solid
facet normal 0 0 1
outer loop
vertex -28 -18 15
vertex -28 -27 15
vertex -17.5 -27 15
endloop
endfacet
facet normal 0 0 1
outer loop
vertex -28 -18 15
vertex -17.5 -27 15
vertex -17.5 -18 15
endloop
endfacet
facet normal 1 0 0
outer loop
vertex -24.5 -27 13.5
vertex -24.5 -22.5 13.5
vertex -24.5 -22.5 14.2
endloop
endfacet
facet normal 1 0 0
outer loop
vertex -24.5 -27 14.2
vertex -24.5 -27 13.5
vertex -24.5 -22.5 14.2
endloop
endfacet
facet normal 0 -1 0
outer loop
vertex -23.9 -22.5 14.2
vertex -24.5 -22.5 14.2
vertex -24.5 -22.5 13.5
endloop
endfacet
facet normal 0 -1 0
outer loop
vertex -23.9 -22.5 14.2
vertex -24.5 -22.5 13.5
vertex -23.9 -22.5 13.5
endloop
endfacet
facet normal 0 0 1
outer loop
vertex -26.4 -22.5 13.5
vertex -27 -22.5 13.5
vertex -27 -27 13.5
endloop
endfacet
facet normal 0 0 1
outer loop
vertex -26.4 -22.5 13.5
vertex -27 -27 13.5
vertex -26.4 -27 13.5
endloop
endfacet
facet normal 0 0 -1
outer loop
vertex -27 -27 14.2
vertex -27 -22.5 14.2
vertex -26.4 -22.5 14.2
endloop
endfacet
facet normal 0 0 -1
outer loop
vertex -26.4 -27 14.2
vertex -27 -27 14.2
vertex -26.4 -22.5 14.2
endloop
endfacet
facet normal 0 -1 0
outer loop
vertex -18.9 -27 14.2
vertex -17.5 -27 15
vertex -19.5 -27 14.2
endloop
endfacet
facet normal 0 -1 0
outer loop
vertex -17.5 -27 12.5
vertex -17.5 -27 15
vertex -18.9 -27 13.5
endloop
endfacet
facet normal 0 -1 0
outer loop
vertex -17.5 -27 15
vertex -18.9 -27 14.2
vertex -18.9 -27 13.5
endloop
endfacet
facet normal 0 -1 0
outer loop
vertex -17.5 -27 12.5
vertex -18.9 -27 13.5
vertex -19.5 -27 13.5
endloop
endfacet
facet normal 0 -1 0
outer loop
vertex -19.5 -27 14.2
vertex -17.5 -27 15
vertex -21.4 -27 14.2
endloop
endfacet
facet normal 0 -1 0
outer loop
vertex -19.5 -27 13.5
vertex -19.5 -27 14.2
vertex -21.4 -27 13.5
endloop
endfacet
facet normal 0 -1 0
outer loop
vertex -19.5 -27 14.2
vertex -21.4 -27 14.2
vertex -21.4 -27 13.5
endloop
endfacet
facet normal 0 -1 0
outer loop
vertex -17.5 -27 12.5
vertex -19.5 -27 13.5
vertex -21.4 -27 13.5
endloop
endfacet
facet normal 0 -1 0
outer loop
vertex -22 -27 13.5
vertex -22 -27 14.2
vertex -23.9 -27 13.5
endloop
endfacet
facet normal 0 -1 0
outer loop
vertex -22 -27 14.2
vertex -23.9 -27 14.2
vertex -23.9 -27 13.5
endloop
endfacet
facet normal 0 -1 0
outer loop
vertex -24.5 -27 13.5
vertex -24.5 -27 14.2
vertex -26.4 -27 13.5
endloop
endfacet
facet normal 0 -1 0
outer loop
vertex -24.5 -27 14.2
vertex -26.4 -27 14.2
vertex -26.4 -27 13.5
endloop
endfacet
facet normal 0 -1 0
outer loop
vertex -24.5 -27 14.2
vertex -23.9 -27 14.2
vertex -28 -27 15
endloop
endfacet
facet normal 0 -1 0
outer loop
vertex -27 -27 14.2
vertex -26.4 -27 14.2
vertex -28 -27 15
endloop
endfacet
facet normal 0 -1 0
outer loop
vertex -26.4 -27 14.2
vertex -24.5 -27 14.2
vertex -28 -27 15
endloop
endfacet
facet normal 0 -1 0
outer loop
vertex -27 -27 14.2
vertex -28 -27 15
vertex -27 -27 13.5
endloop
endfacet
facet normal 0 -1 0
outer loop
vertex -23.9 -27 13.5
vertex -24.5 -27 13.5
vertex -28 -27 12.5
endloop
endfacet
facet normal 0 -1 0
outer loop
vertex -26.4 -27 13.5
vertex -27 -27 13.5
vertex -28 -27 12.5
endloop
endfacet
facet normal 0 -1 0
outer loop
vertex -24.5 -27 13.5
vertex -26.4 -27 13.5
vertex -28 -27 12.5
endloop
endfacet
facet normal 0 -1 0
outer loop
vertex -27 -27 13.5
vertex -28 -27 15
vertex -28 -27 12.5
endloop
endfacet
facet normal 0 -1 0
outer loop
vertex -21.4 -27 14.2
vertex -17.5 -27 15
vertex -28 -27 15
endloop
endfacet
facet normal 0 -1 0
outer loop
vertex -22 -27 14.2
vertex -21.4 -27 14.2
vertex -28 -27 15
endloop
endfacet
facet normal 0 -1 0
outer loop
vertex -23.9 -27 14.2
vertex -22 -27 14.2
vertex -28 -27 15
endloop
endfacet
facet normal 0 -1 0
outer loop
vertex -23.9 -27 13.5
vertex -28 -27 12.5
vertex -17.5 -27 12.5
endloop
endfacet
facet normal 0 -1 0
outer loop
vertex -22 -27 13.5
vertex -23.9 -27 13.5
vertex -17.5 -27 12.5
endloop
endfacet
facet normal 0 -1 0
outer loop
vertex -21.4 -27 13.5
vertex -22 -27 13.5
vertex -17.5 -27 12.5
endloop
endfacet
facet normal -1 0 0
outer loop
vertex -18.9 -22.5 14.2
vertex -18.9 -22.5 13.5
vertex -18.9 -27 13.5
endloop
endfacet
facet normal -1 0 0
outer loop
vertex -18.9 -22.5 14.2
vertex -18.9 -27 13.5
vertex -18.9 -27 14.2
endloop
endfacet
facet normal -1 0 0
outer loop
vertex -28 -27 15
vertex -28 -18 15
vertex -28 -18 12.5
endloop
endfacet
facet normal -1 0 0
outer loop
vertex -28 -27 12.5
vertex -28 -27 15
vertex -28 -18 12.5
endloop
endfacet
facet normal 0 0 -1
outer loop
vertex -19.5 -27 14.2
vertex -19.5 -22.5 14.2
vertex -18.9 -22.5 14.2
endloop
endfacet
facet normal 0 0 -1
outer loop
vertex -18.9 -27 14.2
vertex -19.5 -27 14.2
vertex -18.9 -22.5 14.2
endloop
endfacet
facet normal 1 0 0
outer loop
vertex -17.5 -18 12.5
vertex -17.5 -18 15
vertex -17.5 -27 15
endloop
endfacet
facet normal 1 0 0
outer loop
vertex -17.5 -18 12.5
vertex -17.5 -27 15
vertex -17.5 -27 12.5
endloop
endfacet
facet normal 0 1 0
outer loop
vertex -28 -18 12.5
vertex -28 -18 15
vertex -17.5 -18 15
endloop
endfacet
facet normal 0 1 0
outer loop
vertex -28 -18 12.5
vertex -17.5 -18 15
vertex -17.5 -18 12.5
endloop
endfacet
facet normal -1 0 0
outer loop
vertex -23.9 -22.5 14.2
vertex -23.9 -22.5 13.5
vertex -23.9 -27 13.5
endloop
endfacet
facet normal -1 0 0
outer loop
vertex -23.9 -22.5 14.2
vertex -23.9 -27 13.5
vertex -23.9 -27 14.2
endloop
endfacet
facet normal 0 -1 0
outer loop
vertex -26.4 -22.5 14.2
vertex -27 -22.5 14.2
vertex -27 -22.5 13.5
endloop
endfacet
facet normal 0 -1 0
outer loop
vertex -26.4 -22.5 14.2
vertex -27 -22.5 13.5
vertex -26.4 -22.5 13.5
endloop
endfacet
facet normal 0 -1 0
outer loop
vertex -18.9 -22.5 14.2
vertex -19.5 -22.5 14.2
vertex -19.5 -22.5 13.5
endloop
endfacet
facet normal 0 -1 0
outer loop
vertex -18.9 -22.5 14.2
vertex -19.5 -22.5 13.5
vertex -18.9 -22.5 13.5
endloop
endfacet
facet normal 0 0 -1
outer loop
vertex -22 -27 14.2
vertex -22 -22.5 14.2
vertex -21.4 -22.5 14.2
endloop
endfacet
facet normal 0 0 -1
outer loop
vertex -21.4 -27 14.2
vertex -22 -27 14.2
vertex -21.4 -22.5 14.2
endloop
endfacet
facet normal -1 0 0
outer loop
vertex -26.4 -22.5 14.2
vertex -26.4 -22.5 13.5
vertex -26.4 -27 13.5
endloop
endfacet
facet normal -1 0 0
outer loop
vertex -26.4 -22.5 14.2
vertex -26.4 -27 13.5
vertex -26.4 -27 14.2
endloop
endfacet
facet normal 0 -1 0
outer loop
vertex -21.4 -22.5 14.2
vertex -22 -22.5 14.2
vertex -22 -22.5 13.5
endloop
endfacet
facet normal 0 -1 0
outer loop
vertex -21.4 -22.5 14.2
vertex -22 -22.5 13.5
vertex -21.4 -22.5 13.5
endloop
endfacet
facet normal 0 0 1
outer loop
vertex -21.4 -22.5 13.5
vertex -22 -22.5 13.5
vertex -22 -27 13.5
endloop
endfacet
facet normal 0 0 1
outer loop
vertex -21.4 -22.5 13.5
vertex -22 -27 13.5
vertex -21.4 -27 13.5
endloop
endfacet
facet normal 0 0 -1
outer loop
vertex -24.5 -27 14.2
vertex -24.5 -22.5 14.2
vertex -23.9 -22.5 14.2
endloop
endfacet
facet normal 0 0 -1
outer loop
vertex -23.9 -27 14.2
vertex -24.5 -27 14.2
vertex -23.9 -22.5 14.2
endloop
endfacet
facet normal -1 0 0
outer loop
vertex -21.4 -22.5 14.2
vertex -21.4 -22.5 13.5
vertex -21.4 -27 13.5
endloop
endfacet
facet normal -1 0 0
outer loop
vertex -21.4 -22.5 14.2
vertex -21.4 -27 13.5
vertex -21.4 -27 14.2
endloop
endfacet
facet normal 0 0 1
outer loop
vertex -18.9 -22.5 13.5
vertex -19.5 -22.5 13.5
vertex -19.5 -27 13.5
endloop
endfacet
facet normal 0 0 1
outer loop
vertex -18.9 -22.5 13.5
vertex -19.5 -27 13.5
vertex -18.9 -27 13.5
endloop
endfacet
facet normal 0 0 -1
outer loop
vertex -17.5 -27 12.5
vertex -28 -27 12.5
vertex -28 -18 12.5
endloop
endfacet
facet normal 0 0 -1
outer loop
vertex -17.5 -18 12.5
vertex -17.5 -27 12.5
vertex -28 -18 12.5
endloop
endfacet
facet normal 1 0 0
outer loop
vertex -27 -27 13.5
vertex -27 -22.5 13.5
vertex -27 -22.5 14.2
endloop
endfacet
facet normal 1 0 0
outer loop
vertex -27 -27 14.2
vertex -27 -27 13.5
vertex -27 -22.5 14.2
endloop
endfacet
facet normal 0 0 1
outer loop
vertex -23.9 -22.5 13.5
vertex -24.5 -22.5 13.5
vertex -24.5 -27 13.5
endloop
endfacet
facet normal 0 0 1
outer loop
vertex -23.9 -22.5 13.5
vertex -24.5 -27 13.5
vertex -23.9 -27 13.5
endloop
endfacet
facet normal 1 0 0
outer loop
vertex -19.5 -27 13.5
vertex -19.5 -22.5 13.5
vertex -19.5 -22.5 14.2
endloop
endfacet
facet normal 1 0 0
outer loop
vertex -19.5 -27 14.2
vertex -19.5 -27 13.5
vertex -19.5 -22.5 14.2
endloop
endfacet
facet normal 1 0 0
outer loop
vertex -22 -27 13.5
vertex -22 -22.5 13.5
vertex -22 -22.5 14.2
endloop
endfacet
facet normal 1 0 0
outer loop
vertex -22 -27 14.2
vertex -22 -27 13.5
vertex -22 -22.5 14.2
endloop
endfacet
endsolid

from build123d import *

# Parameters (mm, degrees)
BOX297_W         = 0.6
BOX297_H         = 0.7
BOX297_DEPTH     = 5
ARRAY009_X_COUNT = 4
ARRAY009_X_PITCH = 2.5
BOX296_W         = 2.5
BOX296_H         = 9
BOX296_DEPTH     = 10.5


with BuildPart() as array009:
    # Box297 → Box297 (new body)
    with BuildSketch(Plane(origin=(-27, -22.5, 13.5), x_dir=(1, 0, 0), z_dir=(0, -1, 0))):
        with Locations((0.3, 0.35)):
            Rectangle(BOX297_W, BOX297_H)
    extrude(amount=BOX297_DEPTH)

    # Array009 X: Array009 ×4


with BuildPart() as array009_1:
    add(array009.part)
    with Locations(*[(i * ARRAY009_X_PITCH, 0, 0) for i in range(1, ARRAY009_X_COUNT)]):
        add(array009.part)


with BuildPart() as f_4pineshembra:
    # Box296 → Box296 (new body)
    with BuildSketch(Plane(origin=(-28, -27, 15), x_dir=(0, 0, -1), z_dir=(1, 0, 0))):
        with Locations((1.25, 4.5)):
            Rectangle(BOX296_W, BOX296_H)
    extrude(amount=BOX296_DEPTH)

    # Cut345: cut Array009
    add(array009_1.part, mode=Mode.SUBTRACT)


solid = f_4pineshembra.part
